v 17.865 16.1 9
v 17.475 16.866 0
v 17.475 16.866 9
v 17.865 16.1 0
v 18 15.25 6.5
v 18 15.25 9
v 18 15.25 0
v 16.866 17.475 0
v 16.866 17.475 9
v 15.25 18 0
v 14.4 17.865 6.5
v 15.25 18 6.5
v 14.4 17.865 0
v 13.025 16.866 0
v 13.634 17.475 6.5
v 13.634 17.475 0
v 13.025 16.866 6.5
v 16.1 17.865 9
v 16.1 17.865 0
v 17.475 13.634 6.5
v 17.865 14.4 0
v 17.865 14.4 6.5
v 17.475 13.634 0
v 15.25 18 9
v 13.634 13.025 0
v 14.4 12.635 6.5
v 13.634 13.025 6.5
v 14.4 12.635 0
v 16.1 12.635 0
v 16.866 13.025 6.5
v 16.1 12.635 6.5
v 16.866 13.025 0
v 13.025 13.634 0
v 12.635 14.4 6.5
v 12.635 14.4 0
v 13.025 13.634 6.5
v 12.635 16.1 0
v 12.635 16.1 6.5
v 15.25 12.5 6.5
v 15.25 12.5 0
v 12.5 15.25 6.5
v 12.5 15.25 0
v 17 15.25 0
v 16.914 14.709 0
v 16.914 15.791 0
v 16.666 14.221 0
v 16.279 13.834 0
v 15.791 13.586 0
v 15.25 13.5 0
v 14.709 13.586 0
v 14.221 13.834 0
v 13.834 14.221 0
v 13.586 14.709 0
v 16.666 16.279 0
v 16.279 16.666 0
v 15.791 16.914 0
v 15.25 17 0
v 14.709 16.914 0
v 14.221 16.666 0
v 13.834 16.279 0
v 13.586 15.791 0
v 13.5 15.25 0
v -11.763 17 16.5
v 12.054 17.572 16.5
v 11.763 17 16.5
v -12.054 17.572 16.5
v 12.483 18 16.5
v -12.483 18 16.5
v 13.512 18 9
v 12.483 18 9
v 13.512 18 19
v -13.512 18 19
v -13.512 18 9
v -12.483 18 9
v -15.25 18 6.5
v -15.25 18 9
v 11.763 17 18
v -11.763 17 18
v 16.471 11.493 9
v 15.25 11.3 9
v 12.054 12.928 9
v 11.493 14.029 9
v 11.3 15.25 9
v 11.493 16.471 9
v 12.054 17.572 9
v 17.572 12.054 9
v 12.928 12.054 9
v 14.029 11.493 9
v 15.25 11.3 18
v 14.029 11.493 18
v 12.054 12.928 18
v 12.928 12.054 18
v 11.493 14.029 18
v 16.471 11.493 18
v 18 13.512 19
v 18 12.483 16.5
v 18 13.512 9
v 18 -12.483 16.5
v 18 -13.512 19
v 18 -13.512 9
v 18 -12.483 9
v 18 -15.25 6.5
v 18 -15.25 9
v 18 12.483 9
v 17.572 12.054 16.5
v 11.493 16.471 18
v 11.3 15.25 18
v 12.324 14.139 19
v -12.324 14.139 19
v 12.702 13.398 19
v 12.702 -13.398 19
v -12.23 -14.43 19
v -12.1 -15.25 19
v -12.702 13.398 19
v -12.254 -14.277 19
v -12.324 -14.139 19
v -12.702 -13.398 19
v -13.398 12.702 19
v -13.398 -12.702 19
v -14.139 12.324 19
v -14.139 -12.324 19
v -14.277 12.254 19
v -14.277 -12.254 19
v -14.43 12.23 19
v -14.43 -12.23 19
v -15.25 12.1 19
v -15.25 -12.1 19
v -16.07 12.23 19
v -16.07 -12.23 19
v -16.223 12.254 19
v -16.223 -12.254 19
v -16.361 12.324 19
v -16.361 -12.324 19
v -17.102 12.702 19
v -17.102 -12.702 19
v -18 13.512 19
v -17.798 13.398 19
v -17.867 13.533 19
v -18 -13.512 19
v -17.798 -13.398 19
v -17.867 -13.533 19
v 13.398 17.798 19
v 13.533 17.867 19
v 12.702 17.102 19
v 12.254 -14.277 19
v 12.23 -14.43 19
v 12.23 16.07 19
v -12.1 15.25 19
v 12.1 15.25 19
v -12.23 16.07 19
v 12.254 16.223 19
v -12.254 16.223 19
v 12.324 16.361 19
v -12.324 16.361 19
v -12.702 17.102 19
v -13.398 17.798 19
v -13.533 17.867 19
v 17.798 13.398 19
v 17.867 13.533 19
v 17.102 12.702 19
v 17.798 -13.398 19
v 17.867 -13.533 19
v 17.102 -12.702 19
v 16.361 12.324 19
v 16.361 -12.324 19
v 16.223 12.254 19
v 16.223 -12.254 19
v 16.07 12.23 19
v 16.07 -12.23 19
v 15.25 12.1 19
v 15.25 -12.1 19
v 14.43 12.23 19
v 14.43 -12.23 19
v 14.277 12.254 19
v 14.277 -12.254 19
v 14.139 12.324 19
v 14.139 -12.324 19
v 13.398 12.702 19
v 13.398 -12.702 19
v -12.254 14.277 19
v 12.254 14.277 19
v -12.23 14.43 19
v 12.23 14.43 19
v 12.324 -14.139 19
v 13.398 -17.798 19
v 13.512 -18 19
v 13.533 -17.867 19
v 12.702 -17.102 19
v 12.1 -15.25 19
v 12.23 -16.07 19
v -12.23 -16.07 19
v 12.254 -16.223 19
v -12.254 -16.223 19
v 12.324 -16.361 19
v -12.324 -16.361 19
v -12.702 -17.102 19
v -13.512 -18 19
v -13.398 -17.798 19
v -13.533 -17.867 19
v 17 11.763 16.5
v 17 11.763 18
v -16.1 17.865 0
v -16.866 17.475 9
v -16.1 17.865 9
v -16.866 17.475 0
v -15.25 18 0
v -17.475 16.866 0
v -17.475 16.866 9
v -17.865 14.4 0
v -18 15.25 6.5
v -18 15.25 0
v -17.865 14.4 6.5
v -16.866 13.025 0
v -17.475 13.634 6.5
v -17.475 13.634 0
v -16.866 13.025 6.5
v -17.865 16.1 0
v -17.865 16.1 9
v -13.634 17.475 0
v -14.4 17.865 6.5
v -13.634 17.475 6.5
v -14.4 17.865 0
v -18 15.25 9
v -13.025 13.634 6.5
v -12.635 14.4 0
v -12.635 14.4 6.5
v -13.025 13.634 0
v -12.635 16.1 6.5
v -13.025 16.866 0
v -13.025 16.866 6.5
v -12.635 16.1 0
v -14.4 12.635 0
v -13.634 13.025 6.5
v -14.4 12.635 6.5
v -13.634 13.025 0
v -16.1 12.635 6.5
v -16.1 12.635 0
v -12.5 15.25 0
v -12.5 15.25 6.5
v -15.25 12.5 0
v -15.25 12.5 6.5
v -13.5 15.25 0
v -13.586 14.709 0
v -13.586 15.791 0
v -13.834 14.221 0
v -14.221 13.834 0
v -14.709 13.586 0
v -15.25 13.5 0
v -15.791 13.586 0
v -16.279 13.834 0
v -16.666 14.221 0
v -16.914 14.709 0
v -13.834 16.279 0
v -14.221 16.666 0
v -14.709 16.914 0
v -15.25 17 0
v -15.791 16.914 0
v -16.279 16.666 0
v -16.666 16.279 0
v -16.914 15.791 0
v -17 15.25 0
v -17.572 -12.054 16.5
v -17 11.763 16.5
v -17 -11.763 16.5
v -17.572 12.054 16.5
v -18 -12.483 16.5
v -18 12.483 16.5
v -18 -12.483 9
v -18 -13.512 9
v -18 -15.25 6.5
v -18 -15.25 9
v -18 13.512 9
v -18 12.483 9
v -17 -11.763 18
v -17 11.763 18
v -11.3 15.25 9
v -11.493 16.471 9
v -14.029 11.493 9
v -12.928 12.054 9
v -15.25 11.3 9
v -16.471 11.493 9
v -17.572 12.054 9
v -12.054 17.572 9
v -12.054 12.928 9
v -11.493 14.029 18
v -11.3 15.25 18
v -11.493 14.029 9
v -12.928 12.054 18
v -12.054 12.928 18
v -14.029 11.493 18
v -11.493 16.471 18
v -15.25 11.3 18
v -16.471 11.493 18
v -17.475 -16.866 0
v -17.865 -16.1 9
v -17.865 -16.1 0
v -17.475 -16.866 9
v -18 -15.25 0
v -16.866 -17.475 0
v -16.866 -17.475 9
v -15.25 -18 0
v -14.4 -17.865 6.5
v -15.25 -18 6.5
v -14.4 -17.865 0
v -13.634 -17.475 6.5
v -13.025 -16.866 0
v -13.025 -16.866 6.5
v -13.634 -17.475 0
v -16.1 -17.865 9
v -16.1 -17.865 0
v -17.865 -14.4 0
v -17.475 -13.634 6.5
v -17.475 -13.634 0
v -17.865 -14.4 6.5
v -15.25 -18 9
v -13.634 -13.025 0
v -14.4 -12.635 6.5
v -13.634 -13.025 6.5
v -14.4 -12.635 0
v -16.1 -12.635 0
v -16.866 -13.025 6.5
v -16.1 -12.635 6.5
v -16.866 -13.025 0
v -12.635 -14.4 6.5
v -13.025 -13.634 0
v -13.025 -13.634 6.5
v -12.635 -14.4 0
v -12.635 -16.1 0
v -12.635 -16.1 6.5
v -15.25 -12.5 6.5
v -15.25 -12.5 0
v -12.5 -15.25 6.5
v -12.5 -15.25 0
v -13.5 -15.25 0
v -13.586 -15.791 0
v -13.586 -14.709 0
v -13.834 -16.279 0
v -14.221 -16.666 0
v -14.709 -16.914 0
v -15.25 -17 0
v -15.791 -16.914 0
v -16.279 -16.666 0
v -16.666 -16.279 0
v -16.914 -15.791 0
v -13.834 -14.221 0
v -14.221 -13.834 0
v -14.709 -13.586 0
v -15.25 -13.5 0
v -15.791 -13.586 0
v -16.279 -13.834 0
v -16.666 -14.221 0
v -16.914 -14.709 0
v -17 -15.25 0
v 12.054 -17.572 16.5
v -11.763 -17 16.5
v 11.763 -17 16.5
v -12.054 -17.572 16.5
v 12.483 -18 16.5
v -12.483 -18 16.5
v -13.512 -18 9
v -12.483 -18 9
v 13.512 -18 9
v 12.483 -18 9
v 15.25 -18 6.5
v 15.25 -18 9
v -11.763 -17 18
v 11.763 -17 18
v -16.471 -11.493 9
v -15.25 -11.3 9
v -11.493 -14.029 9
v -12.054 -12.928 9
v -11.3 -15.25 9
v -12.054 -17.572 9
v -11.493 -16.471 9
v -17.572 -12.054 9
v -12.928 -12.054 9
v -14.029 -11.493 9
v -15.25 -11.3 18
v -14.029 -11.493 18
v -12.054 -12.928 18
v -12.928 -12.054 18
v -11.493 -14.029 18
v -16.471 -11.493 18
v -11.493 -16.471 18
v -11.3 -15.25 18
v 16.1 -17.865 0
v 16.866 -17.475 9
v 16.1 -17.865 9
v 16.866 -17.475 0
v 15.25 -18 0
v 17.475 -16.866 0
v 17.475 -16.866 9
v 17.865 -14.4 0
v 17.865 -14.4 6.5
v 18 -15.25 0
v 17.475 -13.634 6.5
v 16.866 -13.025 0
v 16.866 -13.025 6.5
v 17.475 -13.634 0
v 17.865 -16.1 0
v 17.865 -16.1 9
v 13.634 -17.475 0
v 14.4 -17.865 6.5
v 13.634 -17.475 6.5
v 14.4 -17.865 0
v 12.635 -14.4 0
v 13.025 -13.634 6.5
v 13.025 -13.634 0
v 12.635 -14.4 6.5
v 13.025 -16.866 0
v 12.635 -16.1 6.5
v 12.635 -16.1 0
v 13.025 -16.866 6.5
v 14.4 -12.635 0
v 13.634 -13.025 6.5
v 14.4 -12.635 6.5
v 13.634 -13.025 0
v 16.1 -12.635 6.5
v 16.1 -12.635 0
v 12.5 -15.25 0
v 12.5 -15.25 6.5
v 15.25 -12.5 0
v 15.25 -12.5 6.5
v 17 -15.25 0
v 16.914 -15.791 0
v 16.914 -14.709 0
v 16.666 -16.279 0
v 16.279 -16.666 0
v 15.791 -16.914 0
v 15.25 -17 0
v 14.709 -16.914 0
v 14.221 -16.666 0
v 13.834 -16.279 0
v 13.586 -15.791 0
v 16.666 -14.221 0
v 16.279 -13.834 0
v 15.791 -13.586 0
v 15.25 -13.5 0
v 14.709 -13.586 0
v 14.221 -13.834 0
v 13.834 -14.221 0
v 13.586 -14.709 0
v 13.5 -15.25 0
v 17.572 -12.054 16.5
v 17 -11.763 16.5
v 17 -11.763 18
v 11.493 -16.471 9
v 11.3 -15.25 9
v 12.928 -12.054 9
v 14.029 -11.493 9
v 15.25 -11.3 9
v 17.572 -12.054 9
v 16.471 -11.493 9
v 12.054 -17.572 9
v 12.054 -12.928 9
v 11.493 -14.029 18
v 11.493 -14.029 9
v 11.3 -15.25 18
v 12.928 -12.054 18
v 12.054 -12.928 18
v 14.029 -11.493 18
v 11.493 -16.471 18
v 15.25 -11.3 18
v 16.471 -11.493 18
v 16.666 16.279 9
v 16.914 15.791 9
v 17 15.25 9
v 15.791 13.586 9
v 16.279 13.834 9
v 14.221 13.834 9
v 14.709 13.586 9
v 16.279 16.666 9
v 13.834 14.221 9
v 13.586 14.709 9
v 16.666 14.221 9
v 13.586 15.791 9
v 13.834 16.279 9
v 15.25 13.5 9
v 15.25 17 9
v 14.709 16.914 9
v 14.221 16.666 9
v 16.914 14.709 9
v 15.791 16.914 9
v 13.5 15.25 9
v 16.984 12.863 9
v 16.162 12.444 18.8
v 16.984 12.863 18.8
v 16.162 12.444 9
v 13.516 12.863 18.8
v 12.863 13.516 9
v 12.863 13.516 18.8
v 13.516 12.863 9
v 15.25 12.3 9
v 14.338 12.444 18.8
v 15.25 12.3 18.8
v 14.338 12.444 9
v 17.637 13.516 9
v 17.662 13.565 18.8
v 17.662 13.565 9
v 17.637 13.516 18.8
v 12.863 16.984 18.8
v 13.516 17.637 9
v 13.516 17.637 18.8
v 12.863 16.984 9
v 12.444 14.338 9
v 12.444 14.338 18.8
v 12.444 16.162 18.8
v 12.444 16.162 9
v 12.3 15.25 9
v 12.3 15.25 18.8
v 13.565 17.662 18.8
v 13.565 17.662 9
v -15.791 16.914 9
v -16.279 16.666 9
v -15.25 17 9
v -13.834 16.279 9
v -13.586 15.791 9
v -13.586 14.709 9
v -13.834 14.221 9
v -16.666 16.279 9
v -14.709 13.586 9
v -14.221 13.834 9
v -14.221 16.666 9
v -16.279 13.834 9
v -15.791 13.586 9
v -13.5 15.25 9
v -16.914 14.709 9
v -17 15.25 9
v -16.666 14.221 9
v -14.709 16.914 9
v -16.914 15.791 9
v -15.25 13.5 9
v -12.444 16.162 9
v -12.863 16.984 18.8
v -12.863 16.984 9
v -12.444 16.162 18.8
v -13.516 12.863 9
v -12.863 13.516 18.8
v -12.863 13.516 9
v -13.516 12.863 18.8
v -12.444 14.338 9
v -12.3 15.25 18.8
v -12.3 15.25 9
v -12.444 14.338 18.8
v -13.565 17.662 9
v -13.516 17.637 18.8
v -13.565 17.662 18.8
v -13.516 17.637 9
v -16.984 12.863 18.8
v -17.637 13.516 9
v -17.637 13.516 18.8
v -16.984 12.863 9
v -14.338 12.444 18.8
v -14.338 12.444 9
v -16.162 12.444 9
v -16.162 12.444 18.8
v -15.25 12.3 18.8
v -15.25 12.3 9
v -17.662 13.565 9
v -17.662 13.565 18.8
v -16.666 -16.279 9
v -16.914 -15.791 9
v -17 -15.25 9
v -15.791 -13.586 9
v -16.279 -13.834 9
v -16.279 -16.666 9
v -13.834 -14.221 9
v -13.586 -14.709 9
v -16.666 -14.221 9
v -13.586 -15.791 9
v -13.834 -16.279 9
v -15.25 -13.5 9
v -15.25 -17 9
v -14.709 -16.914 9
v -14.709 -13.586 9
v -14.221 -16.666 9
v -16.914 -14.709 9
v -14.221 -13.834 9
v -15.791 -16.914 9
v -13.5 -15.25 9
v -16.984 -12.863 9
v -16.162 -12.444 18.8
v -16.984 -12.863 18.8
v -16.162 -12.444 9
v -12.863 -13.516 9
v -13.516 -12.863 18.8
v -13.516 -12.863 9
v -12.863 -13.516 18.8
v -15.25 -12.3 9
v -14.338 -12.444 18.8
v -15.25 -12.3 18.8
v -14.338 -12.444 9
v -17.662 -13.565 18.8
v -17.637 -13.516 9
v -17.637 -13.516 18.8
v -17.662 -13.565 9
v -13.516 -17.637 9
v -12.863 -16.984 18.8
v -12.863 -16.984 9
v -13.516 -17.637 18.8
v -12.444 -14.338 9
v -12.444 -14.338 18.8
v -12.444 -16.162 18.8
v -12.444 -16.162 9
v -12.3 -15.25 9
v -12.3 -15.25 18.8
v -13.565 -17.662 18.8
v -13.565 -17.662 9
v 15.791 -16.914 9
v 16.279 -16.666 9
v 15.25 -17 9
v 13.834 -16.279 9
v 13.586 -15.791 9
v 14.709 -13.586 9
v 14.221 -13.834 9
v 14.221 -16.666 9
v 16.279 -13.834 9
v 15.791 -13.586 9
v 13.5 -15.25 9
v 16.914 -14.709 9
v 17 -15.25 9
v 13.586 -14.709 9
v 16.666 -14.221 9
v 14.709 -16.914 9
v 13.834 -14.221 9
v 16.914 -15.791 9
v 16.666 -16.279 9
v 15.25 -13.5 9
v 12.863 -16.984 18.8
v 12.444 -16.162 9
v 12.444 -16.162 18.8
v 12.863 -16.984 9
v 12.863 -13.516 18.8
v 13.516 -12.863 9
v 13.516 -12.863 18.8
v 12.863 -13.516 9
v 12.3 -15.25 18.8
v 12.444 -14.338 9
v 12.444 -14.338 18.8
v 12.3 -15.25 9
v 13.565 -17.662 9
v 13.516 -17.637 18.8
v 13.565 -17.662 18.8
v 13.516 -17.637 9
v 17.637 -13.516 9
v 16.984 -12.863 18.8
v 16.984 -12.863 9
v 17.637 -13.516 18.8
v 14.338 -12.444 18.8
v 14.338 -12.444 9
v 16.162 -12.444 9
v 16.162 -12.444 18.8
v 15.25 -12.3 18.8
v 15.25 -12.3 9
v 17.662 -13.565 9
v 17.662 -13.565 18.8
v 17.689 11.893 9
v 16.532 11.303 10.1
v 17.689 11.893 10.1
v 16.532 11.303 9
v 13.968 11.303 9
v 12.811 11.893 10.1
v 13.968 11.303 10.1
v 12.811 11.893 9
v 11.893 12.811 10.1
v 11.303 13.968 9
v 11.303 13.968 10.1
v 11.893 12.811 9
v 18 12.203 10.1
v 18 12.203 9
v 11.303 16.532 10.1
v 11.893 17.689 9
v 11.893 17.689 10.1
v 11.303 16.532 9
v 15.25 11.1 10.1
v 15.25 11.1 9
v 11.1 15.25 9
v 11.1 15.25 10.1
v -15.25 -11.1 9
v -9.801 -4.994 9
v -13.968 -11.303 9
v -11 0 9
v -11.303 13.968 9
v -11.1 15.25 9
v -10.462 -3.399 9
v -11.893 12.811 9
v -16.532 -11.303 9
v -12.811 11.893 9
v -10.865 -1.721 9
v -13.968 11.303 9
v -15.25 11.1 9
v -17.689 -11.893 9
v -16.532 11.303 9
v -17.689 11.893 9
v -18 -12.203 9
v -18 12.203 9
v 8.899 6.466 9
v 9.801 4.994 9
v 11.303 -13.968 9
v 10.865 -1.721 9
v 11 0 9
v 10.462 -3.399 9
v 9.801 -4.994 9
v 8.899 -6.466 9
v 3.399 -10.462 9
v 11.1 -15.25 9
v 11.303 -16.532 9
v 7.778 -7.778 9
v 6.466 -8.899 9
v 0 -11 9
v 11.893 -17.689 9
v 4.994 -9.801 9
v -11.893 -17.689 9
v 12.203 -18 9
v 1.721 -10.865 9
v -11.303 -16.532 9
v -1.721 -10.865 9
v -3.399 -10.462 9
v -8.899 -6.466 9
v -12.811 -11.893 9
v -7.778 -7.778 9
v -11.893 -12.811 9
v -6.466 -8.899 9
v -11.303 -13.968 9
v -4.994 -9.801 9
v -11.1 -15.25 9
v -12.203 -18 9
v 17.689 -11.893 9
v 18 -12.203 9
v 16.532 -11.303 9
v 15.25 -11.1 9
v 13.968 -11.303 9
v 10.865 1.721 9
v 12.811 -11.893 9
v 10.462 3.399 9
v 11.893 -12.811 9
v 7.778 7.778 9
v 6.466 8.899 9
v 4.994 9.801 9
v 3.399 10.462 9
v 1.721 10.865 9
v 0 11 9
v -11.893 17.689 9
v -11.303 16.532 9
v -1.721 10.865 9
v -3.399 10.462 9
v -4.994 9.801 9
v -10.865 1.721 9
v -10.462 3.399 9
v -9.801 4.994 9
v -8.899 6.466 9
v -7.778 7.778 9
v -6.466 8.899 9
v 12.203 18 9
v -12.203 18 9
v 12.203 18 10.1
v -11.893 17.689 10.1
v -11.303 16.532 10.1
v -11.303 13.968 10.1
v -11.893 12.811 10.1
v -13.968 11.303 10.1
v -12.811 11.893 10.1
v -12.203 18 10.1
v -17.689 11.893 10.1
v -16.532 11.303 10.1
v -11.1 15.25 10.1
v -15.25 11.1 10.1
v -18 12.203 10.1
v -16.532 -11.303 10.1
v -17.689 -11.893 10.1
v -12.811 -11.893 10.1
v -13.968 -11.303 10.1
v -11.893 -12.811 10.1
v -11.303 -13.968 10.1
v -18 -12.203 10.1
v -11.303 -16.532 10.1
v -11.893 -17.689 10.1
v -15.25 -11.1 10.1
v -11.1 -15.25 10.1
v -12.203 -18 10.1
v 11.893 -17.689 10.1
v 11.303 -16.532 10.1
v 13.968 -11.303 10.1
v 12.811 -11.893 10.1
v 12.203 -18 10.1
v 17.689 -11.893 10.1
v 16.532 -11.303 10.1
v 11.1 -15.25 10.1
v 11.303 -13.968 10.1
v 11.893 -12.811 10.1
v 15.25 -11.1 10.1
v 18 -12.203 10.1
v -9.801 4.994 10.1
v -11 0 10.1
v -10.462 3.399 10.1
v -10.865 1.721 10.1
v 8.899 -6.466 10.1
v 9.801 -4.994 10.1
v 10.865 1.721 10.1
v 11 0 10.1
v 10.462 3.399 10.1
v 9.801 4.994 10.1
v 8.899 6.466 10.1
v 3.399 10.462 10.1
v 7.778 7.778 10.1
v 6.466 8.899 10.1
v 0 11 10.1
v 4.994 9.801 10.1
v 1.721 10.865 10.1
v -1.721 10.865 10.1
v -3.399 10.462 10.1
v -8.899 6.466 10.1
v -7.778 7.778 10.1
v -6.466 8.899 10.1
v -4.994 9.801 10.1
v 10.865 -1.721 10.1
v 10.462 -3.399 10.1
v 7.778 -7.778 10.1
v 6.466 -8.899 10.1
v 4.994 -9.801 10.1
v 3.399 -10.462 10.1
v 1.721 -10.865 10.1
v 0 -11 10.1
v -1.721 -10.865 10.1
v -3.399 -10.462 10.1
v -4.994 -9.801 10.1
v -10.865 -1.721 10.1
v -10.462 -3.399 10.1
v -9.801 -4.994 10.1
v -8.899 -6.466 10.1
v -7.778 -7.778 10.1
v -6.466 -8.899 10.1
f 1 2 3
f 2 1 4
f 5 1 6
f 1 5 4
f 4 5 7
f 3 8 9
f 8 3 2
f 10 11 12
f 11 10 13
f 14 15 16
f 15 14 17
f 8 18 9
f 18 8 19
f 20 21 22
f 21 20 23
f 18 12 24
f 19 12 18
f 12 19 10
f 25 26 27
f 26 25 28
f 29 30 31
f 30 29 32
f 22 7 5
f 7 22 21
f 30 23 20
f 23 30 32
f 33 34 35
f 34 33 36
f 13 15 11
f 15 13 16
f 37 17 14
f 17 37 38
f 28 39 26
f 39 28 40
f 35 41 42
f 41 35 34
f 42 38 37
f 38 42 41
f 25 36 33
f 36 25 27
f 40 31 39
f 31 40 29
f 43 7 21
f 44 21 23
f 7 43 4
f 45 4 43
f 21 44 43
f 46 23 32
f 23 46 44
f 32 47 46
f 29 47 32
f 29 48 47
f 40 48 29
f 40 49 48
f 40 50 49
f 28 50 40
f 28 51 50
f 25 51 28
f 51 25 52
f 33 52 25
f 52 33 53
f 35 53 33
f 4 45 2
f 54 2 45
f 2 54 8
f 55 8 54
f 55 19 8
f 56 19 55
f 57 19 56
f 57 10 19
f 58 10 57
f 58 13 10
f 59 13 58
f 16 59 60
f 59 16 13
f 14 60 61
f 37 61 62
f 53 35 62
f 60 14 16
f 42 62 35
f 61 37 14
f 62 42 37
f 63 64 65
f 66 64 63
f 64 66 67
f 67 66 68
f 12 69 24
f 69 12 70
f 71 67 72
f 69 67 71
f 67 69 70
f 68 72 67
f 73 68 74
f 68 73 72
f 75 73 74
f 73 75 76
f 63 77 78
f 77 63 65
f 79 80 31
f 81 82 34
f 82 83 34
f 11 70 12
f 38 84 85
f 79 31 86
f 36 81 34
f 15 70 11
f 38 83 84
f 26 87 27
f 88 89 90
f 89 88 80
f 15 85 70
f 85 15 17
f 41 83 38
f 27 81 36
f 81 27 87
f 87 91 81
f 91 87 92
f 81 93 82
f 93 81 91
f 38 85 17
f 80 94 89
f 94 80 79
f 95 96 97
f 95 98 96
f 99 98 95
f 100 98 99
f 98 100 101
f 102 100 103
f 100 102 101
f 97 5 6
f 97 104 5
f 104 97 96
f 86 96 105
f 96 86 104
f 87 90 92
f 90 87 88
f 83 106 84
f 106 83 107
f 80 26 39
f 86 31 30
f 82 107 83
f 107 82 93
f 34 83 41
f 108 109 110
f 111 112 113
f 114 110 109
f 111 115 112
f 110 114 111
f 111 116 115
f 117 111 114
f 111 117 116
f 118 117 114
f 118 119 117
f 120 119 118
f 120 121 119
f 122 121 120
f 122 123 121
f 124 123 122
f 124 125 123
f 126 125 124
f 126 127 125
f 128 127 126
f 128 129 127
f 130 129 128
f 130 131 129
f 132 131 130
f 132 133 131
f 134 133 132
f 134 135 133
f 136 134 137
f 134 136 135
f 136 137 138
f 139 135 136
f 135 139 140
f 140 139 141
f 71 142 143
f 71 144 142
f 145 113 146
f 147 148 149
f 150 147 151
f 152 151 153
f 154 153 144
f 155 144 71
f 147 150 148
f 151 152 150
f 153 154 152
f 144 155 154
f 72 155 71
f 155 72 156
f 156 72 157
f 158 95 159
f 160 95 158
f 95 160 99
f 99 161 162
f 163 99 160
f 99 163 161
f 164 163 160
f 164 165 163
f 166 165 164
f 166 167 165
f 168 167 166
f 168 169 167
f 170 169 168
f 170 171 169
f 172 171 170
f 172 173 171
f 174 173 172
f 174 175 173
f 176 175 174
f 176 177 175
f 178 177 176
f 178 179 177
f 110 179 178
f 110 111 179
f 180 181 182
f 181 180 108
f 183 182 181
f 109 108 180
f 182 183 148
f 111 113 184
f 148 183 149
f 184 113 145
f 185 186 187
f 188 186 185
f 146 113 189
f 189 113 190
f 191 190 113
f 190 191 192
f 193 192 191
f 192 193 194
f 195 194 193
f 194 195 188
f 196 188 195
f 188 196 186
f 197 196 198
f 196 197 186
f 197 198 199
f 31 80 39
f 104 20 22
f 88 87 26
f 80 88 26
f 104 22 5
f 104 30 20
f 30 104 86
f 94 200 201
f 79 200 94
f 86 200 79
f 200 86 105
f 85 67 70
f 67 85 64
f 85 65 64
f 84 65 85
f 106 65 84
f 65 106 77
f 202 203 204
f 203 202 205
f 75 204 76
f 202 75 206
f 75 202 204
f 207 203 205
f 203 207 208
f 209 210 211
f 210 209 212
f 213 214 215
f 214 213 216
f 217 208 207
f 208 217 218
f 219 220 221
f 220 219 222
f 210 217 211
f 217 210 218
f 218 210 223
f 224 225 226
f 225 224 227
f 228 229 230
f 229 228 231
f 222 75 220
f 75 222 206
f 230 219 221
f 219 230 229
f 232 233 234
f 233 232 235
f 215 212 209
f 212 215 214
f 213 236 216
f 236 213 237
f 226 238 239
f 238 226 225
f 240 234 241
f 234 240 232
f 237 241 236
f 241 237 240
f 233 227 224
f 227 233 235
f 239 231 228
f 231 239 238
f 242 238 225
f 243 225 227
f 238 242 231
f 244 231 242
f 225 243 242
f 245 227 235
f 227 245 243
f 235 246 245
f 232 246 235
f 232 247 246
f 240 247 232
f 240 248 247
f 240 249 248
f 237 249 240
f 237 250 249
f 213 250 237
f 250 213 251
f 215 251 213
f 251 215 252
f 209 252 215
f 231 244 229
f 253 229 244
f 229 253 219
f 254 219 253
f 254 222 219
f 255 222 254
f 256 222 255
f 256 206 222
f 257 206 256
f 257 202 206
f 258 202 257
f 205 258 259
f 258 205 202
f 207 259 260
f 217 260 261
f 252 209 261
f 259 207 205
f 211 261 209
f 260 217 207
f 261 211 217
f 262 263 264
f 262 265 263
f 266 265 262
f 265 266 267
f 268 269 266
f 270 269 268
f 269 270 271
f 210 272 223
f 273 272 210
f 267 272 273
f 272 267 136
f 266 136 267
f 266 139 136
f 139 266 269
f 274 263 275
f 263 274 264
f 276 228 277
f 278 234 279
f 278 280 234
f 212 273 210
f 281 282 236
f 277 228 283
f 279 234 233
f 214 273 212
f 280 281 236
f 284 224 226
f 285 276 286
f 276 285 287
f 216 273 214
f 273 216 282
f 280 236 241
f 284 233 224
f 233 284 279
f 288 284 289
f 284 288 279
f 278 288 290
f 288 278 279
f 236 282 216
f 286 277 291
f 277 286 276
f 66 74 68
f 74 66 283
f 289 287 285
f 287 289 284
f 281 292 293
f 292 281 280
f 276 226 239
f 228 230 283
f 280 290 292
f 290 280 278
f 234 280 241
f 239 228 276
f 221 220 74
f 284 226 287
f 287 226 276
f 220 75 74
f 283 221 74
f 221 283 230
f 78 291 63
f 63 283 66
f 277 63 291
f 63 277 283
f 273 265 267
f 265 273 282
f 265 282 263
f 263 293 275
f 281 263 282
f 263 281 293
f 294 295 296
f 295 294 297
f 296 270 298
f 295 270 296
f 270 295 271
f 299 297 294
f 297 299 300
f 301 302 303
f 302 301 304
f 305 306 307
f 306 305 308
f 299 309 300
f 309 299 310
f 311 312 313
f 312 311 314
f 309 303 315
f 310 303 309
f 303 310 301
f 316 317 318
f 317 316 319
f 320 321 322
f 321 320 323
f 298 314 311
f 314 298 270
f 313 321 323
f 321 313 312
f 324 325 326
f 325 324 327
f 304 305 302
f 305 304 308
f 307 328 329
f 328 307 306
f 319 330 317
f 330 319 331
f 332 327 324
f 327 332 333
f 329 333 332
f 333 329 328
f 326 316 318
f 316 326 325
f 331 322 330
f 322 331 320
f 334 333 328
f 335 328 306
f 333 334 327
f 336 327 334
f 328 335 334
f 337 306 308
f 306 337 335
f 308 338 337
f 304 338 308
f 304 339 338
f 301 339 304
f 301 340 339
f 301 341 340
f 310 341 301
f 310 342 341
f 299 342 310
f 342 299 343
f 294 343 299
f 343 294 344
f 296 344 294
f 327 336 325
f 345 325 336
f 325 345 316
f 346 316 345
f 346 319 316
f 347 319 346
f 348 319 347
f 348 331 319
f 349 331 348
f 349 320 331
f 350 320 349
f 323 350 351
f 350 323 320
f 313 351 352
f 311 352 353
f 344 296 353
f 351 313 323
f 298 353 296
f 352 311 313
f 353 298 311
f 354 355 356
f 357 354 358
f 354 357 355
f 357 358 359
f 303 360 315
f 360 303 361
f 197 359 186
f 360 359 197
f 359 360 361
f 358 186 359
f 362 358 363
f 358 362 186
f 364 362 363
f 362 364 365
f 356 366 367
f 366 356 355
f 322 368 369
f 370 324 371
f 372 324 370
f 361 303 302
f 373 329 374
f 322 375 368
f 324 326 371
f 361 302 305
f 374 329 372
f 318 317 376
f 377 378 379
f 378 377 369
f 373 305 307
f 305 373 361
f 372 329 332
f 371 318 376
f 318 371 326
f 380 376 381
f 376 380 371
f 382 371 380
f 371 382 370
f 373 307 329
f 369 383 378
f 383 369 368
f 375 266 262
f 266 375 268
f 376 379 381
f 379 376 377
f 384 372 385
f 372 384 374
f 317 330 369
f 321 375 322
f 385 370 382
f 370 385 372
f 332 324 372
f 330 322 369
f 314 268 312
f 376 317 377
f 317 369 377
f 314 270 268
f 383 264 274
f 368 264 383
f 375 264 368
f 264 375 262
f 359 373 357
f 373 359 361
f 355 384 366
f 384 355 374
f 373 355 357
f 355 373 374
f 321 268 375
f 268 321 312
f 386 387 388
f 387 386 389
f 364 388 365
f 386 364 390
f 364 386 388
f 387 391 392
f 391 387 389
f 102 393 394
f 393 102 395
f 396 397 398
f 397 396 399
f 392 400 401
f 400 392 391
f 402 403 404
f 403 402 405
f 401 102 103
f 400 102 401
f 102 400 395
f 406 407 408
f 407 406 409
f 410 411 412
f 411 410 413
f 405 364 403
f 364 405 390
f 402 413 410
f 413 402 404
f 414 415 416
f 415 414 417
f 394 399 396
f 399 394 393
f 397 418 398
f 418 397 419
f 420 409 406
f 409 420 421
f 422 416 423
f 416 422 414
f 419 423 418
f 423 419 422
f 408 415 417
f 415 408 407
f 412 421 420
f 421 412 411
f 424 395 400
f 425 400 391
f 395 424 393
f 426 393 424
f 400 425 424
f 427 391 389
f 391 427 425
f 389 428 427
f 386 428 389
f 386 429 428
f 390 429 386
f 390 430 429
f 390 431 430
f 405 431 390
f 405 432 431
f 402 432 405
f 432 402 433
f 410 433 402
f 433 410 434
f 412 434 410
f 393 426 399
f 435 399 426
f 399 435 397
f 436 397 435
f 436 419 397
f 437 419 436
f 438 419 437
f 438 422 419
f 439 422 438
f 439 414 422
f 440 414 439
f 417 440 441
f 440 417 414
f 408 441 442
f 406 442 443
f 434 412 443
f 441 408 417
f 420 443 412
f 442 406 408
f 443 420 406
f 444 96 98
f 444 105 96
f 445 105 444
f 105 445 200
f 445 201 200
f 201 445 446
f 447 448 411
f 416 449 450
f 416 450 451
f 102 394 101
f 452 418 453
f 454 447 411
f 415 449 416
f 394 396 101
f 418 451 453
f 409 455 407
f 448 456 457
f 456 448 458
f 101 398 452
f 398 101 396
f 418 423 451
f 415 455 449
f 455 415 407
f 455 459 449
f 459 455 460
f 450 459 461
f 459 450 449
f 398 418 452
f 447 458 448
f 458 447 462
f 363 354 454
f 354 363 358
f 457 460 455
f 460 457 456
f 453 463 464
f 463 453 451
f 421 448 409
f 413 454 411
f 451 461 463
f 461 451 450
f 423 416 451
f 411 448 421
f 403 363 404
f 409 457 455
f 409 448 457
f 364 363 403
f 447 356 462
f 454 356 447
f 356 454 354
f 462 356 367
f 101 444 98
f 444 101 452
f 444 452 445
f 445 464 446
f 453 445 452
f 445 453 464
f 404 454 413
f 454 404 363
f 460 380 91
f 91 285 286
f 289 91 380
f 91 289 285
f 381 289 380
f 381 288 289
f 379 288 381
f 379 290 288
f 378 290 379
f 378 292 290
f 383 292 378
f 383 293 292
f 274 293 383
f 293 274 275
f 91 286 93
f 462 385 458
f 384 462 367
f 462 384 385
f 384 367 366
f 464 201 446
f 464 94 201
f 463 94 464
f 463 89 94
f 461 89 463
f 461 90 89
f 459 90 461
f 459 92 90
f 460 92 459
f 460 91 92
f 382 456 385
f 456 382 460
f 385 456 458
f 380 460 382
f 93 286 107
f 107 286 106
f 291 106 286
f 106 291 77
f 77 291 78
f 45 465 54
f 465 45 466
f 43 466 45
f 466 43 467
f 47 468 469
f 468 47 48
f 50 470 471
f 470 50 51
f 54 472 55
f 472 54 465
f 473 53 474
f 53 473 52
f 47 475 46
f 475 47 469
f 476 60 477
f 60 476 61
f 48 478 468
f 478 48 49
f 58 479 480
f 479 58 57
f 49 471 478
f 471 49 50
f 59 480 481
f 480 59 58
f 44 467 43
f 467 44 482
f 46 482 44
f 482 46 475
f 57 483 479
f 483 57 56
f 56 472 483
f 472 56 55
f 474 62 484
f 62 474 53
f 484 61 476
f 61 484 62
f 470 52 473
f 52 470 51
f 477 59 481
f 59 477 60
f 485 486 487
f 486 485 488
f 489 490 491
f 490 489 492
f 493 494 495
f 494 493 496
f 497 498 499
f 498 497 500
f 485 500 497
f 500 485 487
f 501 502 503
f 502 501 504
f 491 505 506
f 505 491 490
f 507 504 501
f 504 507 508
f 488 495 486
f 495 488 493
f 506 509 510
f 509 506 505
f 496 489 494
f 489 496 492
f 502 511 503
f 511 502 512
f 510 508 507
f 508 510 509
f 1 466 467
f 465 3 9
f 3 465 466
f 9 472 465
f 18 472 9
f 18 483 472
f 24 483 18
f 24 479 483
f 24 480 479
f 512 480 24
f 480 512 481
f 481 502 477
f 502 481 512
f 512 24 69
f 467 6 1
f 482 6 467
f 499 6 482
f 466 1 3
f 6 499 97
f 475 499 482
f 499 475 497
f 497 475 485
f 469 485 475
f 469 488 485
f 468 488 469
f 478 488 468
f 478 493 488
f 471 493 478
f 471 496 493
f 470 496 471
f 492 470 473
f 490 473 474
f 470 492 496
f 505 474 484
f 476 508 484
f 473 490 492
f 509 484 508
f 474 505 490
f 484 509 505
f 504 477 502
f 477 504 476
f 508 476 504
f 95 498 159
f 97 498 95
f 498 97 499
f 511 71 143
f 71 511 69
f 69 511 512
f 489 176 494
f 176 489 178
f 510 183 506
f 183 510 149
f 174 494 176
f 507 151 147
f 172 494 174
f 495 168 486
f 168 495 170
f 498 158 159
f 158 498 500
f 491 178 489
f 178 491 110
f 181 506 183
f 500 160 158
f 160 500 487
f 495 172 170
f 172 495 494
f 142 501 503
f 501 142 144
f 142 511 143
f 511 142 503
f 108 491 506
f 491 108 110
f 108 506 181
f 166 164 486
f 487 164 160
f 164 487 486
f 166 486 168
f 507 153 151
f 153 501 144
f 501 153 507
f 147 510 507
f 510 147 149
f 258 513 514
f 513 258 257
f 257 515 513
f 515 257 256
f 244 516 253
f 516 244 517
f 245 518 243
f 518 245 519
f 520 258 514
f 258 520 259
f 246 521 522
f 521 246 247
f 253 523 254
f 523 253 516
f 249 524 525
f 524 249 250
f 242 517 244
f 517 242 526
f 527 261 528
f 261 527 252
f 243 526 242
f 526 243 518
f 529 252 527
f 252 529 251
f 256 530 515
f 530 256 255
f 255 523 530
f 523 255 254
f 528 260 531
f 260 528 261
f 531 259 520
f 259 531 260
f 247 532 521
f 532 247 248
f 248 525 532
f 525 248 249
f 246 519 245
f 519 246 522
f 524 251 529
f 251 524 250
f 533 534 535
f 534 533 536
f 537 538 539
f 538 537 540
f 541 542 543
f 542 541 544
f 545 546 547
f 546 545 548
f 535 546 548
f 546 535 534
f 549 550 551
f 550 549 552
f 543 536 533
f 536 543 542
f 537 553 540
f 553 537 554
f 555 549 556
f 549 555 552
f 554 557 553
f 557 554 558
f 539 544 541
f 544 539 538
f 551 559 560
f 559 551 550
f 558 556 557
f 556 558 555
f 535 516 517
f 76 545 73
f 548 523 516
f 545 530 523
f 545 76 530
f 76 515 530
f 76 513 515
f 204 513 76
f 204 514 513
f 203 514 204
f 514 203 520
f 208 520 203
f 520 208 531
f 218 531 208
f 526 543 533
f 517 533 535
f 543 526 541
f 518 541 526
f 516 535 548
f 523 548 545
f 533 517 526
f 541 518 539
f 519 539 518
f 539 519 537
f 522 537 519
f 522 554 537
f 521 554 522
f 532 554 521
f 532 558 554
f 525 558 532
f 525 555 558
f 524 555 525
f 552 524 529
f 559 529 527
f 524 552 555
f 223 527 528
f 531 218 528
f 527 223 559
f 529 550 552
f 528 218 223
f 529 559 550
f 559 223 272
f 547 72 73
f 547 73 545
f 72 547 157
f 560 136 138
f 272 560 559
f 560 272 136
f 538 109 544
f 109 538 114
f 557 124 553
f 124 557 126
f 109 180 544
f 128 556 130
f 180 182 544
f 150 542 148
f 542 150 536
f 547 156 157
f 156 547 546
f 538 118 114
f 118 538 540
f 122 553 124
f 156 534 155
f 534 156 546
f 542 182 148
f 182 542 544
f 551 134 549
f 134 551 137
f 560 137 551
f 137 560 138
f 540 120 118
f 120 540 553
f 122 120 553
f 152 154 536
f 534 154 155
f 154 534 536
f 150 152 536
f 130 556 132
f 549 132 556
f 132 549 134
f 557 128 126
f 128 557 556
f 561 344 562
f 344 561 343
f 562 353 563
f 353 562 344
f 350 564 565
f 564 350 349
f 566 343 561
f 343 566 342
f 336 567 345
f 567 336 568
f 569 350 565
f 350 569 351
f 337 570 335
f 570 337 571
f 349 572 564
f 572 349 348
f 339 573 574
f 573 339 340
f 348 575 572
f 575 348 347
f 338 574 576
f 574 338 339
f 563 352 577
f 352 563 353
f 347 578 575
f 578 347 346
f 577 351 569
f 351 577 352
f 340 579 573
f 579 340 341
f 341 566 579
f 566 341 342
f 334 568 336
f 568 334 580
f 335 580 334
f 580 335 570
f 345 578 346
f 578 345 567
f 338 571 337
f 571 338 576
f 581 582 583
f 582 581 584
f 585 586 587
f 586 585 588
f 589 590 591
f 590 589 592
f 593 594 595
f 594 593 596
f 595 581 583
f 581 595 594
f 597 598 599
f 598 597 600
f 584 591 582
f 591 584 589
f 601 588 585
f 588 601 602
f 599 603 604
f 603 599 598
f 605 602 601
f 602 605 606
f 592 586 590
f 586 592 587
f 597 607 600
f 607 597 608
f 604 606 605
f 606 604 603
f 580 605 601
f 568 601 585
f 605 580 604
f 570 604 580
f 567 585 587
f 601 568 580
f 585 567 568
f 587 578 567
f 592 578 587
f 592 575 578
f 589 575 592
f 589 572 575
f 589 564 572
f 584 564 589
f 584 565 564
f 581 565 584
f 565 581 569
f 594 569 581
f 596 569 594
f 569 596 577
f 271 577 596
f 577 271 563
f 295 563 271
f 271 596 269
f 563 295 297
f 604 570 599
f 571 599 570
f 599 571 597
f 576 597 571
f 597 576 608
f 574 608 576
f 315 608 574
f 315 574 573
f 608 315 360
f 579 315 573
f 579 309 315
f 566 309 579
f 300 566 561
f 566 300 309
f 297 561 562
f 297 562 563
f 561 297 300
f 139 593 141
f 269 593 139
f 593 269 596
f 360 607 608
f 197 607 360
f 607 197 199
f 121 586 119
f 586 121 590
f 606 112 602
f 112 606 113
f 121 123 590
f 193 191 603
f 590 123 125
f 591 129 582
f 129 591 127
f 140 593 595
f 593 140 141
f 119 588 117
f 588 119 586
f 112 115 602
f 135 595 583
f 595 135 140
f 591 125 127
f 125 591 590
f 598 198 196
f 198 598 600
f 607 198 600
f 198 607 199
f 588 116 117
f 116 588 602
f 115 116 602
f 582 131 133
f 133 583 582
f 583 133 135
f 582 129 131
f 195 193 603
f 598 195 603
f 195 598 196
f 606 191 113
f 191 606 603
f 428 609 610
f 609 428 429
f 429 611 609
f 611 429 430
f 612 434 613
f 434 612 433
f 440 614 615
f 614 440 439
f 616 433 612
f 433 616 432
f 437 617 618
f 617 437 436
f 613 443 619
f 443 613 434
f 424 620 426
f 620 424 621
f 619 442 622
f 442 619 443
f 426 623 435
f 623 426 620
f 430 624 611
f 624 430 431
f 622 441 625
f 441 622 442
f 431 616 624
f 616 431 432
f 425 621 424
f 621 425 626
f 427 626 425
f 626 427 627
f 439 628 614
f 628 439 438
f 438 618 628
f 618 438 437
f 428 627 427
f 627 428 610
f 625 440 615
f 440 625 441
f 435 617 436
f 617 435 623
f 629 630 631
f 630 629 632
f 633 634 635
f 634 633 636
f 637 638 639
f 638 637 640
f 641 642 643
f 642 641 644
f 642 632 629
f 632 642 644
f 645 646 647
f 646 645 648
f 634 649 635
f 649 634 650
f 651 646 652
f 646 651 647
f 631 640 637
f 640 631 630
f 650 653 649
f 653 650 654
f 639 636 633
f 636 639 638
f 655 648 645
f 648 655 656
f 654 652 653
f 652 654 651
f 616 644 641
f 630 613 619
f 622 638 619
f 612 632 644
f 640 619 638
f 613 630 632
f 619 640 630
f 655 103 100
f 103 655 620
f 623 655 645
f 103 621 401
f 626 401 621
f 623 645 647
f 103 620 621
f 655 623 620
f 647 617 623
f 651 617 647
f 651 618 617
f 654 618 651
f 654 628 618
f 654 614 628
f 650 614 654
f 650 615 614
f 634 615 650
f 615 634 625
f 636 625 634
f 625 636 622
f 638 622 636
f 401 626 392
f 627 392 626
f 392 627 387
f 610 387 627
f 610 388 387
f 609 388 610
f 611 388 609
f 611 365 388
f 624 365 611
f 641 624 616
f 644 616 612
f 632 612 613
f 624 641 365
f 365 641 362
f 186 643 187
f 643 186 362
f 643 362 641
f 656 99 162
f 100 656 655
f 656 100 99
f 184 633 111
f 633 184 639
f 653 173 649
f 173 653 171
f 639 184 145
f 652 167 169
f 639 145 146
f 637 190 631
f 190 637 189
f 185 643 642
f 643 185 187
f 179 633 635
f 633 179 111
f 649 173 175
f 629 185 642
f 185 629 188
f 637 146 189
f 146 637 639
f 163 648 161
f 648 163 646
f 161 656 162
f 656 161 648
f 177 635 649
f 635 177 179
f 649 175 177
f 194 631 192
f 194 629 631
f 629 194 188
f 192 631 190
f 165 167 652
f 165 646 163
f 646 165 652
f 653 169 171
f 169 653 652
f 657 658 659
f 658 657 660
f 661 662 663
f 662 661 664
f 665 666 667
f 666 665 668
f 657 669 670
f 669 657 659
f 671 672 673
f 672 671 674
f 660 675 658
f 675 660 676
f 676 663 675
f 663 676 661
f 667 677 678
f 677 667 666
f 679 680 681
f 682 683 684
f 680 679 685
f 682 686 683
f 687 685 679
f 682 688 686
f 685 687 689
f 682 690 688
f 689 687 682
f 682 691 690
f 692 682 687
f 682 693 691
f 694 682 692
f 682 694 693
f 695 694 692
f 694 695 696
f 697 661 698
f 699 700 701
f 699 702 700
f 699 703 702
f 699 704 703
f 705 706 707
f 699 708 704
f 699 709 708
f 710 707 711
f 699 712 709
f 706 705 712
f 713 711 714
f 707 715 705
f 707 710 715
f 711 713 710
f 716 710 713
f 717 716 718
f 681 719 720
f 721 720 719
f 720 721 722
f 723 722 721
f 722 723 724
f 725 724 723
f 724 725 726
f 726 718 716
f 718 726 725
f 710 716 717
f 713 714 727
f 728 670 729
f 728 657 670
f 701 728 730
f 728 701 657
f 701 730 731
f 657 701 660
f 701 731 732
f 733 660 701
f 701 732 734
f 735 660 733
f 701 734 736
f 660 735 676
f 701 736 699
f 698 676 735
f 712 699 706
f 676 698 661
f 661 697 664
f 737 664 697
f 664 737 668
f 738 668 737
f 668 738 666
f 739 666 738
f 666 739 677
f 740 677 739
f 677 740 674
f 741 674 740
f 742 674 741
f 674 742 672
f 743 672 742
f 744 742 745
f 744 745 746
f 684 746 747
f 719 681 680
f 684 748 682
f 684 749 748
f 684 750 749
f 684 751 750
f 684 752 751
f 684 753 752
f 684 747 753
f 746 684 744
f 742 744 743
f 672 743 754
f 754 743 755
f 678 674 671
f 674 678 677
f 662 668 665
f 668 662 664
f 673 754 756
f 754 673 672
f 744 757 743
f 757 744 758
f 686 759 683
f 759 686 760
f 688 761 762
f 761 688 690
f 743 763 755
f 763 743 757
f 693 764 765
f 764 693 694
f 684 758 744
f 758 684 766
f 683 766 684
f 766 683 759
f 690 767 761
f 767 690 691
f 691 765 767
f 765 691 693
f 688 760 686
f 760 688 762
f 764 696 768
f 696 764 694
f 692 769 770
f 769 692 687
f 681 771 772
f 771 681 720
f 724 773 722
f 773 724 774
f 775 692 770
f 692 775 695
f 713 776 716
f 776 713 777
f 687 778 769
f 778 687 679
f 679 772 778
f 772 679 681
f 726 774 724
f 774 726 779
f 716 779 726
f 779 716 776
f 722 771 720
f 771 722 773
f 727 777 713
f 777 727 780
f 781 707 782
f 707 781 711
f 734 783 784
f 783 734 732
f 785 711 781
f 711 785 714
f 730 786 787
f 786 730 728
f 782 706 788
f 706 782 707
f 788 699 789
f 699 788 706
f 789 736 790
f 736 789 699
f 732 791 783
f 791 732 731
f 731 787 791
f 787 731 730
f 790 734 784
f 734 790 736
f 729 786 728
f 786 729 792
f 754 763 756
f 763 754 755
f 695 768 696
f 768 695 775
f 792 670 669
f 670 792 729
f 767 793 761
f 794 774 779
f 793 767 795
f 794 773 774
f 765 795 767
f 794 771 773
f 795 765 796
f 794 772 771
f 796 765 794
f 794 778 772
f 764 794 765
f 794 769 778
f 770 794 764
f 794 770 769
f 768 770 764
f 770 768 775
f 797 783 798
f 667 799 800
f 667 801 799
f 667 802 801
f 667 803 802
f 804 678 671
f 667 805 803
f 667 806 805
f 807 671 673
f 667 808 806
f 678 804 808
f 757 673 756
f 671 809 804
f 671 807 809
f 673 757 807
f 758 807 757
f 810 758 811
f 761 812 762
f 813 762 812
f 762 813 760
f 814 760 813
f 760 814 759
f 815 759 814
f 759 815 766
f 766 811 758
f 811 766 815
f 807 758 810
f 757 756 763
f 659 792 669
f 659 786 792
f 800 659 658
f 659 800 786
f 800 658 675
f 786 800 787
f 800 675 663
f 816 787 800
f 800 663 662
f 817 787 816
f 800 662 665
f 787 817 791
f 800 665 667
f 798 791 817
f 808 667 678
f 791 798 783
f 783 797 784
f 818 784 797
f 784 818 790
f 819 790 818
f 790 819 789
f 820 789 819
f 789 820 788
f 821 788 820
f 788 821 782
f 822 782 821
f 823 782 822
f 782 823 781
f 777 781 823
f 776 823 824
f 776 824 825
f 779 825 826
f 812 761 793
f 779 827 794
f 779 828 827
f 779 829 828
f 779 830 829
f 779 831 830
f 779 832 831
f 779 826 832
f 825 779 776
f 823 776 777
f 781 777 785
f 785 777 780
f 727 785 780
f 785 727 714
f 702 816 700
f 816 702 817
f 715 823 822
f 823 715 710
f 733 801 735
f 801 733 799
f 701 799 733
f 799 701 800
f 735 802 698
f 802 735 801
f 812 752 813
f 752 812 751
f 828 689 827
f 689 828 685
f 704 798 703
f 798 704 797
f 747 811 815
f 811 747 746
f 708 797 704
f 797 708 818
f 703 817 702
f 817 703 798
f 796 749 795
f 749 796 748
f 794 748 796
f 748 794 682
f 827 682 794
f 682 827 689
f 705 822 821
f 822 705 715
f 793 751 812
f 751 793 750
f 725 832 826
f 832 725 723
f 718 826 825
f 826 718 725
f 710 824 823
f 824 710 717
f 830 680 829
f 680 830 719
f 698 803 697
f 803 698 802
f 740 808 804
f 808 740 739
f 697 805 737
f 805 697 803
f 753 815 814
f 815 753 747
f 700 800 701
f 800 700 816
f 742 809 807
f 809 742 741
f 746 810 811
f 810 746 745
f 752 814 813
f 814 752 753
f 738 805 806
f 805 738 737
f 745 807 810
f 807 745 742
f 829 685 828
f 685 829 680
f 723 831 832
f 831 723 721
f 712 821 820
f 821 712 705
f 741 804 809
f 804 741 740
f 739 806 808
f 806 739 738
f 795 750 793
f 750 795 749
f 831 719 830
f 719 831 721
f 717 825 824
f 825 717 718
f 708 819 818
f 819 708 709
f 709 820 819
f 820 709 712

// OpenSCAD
//**********************************************
//       GPS Cover Dome for Quadcopter 30.5 x 30.5mm FC
//  Source Code and created objects are free for private use
//              (C) Henning Stöcklein   18.10.2015

//********** Change log **********************************
// 18.10.2015   Created as split off my FNQ Foldable Quadcopter Source
// 24.10.2015   Screw top head chamfer added, optional top hole added
//********** End Change log *******************************

/* [Object Selection] */

// What to print
visible = "all" ; // ["all", "top plate", "level plate"]

// Support Structure 
Support = 0 ;  // [0:No, 1:Yes]


/* [Base geometry] */

// Footprint Hole Distance
fhd = 30.5 ;

// Dome height
h_dome = 18.0; // [8:30]

// Top Plate thickness
h_Plate = 1.0 ;

// Plate Border height
h_Bord = 2.0 ;

// Weight reduction hole diameter
tophole_dia = 0 ; // [0:28]

// Cylinder Outer Diameter
Cyl_Dia = 5.5 ;

// Cylinder Segment Wall Thickness
Cyl_Wall = 1.2 ;

// Screw Hole Diameter
M3_Dia = 3.5 ;

// Screw Head Sink Diameter
M3_Sink_dia = 5.9 ;
    
// Screw Head Sink Depth (0=Flat on top)
M3_Sink_ht = 10 ;

// Screw Head Hole Chamfer depth
M3_Head_Chamfer = 0.2 ;

/* [Intermediate plate] */

// Level plate Z position
z_level = 9 ; // [9:22]

// Level plate thickness
h_level = 1.1 ;

// Gap between domes and level plate
Gap_level = 0.2 ;

// Weight reduction hole diameter
level_dia = 22 ; // [0:28]


//*******************************************
//*  Select here what to print
//*******************************************
if (visible == "all") {
    coverdome() ;
    levelplate() ;
}

if (visible == "top plate") {
    coverdome() ;
}

if (visible == "level plate") {
    levelplate() ;
}
    
// *************************************************
//    Cover dome for 30.5 x 30.5 FC footprint
// *************************************************
module coverdome()
{
   // Holder for FC footprint 30.5x30.5 (e.g. Naze32)
   difference() {
      union() {
		// Top plate = Round cube
        translate ([0,0,h_dome]) 
          hull() {
            translate ([+fhd/2,+fhd/2,0]) cylinder (r=Cyl_Dia/2, h=h_Plate, $fn=20) ;
            translate ([+fhd/2,-fhd/2,0]) cylinder (r=Cyl_Dia/2, h=h_Plate, $fn=20) ;		
            translate ([-fhd/2,+fhd/2,0]) cylinder (r=Cyl_Dia/2, h=h_Plate, $fn=20) ;		
            translate ([-fhd/2,-fhd/2,0]) cylinder (r=Cyl_Dia/2, h=h_Plate, $fn=20) ;		
        } // hull
        
        // 4 cylindrical legs with screw holes
        for (i=[0:90:350])
        {
            rotate ([0,0,i]) 
            {
        		// Domes for M3 screws
                translate ([+fhd/2,+fhd/2,0]) cylinder (r=Cyl_Dia/2, h=h_dome, $fn=20) ;

        	    // Small side wall
                translate ([0,+fhd/2+Cyl_Dia/2-h_Plate/2,h_dome-h_Plate/2]) 
                    cube ([fhd, h_Plate, h_Bord], center=true) ;

         		// Dome strengthening segments
                hull () 
                {
                intersection () {
                     translate ([+fhd/2,+fhd/2,h_dome+h_Plate-M3_Sink_ht])
                        cylinder (r=Cyl_Wall+Cyl_Dia/2, h=M3_Sink_ht, $fn=20) ;
                     hullplate() ;
                  } // intersection
                  translate ([+fhd/2,+fhd/2,h_dome+h_Plate-M3_Sink_ht-2.5]) 
                      cylinder (r=Cyl_Dia/2, h=0.1, $fn=20) ;
                 } // hull
             } // rotate
         } // for        
      } // union
      
      // Cutout objects for 4 screw holes
      for (i=[0:90:350])
      {
          rotate ([0,0,i]) 
          {
        	  // Holes for M3 bolts
              translate ([+fhd/2,+fhd/2,0]) 
                  cylinder (r=M3_Dia/2, h=50, $fn=20, center=true) ;
      
        	  // Sink Holes for M3 heads
              translate ([+fhd/2,+fhd/2,h_dome+h_Plate-M3_Sink_ht]) 
                  cylinder (r=M3_Sink_dia/2, h=M3_Sink_ht+0.05, $fn=20) ; 

        	  // Chamfer Cylinder for segmented area (if any)
              translate ([+fhd/2+M3_Sink_dia/2,+fhd/2+M3_Sink_dia/2,h_dome+h_Plate-M3_Sink_ht]) 
                  cylinder (r=M3_Sink_dia/1.25, h=M3_Sink_ht+0.05, $fn=20) ; 

        	  // Chamfer Cylinder at top screw hole cutout (if any)
              translate ([+fhd/2,+fhd/2,h_dome+h_Plate-M3_Head_Chamfer]) 
                  cylinder (r1=M3_Sink_dia/2, r2=M3_Sink_dia/2+2, h=2, $fn=20) ; 
          } // rotate
      } // for
      
      // Weight reduction hole
      translate ([0,0,h_dome]) cylinder (r=tophole_dia/2, h=h_Plate+3, $fn=40, center=true) ;  

   } // difference
   
   // Support structure (if cutout legs)
   if (Support == 1) {
     for (i=[0:90:350])
     { 
        rotate ([0,0,i]) 
        {
           translate ([+fhd/2+Cyl_Dia/3,+fhd/2+Cyl_Dia/3,h_dome+h_Plate-M3_Sink_ht]) 
               cylinder (r=0.8, h=M3_Sink_ht+0.05, $fn=20) ; 
        } // rotate
    } // for
  } // if
}

//********************************************
// Additional plate can be fixed in the middle of the Domes
//********************************************
module levelplate()
{
   // Intermediate level to fix GPS module
   difference() {
      union() {
		// Plate = Round cube
        translate ([0,0,z_level]) 
          hull() {
            translate ([+fhd/2,+fhd/2,0]) cylinder (r=Cyl_Dia/2, h=h_level, $fn=20) ;
            translate ([+fhd/2,-fhd/2,0]) cylinder (r=Cyl_Dia/2, h=h_level, $fn=20) ;		
            translate ([-fhd/2,+fhd/2,0]) cylinder (r=Cyl_Dia/2, h=h_level, $fn=20) ;		
            translate ([-fhd/2,-fhd/2,0]) cylinder (r=Cyl_Dia/2, h=h_level, $fn=20) ;		
        } // hull
      } // union

      // Weight reduction hole
      translate ([0,0,z_level]) cylinder (r=level_dia/2, h=h_level+2, $fn=40, center=true) ; 
        
      // 4 cylindrical legs with screw holes
      for (i=[0:90:350])
      {
          rotate ([0,0,i]) 
          {
        		// Holes for Domes 
                translate ([+fhd/2,+fhd/2,0]) 
                    cylinder (r=Cyl_Dia/2+Gap_level, h=h_dome, $fn=20) ;

                // Holes for Strengthening Dome Segments              
                translate ([+fhd/2,+fhd/2,h_dome+h_Plate-M3_Sink_ht])
                     cylinder (r=Cyl_Wall+Cyl_Dia/2+Gap_level, h=M3_Sink_ht, $fn=20) ;
          } // rotate
      } // for
  } // difference
}

module hullplate()
{
    // Top plate = Round cube
    hull() {
            translate ([+fhd/2,+fhd/2,0]) cylinder (r=Cyl_Dia/2, h=40, $fn=20) ;
            translate ([+fhd/2,-fhd/2,0]) cylinder (r=Cyl_Dia/2, h=40, $fn=20) ;		
            translate ([-fhd/2,+fhd/2,0]) cylinder (r=Cyl_Dia/2, h=40, $fn=20) ;		
            translate ([-fhd/2,-fhd/2,0]) cylinder (r=Cyl_Dia/2, h=40, $fn=20) ;		
   } // hull
}
